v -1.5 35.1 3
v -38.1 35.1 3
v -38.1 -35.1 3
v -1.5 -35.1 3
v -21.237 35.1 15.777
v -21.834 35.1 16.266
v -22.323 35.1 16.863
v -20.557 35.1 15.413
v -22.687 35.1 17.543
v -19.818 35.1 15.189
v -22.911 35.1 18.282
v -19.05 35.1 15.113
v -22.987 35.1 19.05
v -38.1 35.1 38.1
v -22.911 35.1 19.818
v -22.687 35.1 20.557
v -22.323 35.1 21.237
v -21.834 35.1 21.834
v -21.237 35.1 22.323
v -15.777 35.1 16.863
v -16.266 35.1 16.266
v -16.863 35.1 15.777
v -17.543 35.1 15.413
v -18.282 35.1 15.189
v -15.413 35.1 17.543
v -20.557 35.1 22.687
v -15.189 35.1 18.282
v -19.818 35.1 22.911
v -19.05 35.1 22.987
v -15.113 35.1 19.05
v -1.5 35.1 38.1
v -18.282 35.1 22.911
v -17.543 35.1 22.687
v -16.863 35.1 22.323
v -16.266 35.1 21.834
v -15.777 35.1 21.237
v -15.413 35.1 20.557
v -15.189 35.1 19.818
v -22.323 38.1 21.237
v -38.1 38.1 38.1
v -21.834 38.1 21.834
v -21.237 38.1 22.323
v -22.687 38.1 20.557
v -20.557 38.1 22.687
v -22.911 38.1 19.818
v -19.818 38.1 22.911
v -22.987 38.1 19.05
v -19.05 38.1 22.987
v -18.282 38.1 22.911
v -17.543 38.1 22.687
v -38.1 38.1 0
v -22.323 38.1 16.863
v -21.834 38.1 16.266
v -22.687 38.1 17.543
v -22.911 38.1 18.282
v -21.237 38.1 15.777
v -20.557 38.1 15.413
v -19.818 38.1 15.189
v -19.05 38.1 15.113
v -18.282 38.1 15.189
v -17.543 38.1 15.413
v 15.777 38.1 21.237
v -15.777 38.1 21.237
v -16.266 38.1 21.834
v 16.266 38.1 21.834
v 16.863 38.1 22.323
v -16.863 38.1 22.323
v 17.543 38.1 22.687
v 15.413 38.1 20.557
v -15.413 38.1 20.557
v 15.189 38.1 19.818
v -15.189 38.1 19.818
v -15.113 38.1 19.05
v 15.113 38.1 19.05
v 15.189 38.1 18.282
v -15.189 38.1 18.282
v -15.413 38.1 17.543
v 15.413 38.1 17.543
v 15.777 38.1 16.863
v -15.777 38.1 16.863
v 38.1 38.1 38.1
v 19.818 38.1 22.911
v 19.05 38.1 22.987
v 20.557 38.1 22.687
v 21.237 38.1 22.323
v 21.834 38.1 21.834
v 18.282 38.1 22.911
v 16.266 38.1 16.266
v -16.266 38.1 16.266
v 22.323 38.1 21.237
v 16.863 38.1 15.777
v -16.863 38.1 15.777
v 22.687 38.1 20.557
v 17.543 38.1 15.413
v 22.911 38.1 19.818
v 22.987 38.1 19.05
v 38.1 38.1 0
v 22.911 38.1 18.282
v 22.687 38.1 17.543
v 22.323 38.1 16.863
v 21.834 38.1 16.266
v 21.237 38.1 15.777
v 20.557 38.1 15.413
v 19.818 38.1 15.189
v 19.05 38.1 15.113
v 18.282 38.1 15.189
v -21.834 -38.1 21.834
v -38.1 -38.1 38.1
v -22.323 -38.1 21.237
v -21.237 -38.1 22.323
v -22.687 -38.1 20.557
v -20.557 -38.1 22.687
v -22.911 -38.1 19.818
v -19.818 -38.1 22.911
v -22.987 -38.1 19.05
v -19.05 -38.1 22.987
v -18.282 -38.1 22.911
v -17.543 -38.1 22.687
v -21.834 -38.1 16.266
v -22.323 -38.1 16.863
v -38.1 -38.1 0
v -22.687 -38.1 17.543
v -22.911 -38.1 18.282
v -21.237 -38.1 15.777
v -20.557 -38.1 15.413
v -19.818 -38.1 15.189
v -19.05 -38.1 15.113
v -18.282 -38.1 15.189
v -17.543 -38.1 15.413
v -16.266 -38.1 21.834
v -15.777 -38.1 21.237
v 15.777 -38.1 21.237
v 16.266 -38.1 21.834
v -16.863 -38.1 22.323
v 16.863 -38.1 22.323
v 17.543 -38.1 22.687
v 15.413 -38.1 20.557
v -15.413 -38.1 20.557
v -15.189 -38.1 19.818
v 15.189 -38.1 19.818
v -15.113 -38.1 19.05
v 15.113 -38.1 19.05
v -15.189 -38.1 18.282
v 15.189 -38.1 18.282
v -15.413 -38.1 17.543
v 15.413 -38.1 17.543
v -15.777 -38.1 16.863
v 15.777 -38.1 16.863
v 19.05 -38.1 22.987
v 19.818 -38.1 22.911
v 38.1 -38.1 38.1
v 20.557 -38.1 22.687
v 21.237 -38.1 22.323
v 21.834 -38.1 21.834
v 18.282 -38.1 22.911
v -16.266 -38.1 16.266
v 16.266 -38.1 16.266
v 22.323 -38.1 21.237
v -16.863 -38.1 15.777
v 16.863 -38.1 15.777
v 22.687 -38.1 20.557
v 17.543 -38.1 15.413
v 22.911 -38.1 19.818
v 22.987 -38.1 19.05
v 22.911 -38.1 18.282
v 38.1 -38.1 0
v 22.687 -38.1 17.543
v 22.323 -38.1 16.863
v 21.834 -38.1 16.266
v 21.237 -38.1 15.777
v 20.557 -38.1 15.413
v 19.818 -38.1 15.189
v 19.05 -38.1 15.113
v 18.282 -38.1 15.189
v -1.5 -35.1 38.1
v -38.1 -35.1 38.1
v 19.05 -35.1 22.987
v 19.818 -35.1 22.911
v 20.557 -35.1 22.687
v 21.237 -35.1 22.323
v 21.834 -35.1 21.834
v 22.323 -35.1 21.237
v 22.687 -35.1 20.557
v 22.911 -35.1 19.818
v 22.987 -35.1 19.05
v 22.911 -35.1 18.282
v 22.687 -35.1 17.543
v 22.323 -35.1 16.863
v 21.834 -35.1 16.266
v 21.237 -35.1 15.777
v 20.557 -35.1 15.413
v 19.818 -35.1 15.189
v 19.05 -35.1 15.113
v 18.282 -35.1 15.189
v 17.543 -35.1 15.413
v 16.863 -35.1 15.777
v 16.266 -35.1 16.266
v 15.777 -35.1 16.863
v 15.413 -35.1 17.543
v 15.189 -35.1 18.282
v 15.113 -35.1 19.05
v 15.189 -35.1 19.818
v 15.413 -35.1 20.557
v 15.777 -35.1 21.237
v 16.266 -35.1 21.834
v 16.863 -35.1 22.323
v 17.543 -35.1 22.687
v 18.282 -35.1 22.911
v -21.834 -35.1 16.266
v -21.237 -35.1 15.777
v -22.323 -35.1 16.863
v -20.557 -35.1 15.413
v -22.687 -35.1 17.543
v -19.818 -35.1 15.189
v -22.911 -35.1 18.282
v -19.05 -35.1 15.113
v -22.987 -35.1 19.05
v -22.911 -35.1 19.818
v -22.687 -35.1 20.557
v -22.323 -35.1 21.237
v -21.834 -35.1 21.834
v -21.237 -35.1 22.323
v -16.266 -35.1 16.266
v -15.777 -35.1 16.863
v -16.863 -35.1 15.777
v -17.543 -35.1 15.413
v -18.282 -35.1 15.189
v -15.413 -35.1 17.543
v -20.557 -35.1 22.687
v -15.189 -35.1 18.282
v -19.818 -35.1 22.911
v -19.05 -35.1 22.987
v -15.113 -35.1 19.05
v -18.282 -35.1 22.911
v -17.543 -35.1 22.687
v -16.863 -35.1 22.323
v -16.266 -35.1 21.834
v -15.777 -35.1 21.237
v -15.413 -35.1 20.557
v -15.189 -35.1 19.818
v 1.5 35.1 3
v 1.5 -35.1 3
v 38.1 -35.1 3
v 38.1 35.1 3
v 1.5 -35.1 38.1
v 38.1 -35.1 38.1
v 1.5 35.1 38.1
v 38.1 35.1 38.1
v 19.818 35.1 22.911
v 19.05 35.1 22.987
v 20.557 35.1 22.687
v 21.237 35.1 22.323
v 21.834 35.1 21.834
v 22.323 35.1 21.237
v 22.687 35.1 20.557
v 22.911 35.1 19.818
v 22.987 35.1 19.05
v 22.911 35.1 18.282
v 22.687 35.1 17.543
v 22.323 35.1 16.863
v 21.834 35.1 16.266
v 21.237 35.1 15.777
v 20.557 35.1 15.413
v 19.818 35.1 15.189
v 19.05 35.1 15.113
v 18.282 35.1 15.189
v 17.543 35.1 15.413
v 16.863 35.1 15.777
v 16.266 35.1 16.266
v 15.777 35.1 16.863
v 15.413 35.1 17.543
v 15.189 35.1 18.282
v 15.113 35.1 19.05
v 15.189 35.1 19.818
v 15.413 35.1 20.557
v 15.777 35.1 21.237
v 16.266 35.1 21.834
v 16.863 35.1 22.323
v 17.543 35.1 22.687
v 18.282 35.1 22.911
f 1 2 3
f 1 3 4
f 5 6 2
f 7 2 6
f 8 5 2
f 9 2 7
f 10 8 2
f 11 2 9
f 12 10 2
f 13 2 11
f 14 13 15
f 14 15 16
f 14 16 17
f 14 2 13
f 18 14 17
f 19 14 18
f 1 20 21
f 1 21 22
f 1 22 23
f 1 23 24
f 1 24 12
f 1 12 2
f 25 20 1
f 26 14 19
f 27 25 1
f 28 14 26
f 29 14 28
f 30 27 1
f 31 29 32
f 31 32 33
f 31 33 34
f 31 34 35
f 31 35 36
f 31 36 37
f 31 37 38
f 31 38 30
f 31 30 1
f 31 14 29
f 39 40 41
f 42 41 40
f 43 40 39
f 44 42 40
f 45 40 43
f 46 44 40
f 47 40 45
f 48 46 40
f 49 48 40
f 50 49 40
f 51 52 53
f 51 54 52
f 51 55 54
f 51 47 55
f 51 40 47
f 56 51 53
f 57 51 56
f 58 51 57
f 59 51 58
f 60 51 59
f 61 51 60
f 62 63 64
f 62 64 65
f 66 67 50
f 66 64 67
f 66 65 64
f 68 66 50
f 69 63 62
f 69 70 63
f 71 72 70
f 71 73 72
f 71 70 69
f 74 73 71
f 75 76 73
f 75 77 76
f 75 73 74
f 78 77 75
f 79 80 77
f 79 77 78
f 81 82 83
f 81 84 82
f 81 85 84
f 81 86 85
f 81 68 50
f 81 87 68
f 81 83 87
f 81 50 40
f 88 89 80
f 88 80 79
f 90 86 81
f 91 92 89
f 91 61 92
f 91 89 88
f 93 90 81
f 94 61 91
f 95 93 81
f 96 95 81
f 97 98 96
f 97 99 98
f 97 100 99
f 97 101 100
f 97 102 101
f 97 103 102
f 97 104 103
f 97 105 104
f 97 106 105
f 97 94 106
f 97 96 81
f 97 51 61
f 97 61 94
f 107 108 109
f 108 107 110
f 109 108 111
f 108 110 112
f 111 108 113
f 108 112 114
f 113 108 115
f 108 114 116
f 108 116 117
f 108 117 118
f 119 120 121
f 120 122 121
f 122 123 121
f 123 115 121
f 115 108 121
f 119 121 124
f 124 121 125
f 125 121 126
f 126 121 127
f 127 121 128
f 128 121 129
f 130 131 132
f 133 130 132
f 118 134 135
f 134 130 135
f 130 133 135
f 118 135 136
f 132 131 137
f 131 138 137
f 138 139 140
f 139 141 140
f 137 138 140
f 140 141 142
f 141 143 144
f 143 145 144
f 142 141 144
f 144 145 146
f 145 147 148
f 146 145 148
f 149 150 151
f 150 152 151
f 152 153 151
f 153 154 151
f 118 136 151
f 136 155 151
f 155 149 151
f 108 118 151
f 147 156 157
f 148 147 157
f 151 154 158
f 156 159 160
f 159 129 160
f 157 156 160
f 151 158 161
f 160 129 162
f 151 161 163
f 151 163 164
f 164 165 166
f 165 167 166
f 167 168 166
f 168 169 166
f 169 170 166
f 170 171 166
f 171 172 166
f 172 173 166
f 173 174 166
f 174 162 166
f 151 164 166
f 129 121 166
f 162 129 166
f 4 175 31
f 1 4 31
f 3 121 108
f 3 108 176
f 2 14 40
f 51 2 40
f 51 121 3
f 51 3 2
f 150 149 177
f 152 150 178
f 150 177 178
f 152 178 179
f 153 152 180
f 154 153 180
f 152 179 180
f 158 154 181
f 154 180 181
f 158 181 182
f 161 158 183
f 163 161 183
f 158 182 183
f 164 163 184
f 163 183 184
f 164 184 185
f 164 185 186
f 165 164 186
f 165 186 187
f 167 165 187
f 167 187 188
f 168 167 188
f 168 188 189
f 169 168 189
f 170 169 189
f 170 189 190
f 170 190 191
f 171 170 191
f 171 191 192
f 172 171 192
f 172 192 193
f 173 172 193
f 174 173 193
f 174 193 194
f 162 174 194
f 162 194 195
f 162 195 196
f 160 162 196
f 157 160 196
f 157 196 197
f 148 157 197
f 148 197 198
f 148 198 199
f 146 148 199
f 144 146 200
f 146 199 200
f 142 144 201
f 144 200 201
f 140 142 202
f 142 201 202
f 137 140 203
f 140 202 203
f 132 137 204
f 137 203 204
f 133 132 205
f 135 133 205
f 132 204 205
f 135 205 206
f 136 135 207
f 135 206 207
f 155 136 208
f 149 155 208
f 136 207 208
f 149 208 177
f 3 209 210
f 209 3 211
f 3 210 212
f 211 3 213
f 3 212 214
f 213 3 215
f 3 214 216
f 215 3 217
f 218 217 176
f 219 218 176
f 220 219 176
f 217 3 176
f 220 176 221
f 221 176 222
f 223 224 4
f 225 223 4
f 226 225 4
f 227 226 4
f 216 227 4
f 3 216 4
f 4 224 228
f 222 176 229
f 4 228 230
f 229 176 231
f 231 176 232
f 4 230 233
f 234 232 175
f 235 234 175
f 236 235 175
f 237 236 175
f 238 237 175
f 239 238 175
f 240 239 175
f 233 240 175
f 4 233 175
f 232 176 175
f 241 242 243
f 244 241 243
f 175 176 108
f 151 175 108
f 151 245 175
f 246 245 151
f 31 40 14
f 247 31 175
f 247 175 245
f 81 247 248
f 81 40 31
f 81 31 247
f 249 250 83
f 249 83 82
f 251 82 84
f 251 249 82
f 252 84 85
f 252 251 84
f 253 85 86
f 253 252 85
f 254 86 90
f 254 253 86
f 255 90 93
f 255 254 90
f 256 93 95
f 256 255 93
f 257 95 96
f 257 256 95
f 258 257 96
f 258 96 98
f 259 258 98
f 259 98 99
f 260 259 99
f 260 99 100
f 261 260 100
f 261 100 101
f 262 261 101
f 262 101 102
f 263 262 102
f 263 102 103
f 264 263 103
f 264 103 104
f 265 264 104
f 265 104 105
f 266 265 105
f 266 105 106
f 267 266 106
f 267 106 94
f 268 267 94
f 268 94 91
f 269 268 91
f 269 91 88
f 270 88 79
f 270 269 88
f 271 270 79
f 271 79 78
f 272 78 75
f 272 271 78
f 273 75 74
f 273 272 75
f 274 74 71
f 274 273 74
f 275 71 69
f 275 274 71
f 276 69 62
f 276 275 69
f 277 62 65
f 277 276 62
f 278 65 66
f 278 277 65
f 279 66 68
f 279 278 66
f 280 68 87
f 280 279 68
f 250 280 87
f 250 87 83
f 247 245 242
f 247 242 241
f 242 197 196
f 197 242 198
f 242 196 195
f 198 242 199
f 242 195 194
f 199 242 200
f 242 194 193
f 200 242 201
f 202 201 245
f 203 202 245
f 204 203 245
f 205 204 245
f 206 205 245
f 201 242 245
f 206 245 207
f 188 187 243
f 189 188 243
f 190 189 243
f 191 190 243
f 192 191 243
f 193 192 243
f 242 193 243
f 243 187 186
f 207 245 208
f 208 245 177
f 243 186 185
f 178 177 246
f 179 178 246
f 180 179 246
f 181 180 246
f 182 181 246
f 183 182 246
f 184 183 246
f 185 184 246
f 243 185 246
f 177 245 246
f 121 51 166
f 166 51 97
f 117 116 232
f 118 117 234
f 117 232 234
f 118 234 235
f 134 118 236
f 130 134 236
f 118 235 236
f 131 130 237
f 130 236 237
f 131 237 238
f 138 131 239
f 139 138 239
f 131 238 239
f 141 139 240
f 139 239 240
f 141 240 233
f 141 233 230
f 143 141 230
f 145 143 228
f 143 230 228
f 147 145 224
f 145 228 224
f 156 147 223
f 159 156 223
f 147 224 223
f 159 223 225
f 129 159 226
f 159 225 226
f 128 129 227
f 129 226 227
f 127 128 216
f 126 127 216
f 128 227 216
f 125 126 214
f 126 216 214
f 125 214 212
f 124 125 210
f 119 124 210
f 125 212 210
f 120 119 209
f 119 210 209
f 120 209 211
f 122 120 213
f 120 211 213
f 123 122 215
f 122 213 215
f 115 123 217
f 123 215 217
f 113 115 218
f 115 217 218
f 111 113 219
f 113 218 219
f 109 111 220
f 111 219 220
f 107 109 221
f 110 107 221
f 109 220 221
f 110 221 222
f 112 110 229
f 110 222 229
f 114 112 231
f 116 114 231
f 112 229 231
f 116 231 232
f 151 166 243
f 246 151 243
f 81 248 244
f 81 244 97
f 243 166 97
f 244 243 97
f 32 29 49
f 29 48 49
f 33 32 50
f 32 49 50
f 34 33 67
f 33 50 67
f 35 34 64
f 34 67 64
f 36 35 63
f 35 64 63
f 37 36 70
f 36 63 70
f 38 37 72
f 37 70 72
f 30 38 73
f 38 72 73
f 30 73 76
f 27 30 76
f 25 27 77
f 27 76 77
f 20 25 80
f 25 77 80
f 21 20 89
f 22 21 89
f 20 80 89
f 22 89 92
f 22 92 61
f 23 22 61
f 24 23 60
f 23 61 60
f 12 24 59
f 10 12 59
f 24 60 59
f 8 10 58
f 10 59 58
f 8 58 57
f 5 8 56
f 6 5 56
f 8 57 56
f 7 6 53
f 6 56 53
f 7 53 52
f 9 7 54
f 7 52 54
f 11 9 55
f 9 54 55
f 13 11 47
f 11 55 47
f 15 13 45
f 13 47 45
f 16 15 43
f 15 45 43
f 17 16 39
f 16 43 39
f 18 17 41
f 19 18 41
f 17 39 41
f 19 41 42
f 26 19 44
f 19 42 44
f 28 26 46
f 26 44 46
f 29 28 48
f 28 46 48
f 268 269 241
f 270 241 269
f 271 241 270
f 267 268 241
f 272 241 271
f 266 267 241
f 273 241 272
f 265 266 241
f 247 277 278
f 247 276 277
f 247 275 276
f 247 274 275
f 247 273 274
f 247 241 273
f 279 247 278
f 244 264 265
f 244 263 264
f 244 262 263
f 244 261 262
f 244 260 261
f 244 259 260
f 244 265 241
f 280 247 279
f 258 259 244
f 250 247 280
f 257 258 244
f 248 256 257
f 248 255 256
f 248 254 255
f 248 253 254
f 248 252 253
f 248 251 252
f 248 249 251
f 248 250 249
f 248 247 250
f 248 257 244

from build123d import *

# Parameters (mm, degrees)
SKETCH1_W           = 76.2
SKETCH1_H           = 76.2
BOSS_EXTRUDE1_DEPTH = 38.1
SKETCH3_W           = 39.463440316
SKETCH3_H           = 70.199999808
SKETCH3_W_2         = 39.34827811
CUT_EXTRUDE1_DEPTH  = 35.100000006
SKETCH4_R           = 3.937
CUT_EXTRUDE2_DEPTH  = 38.1


with BuildPart() as part:
    # Sketch1 → Boss-Extrude1 (new body)
    with BuildSketch(Plane.XY):
        Rectangle(SKETCH1_W, SKETCH1_H)
    extrude(amount=BOSS_EXTRUDE1_DEPTH)

    # Sketch3 → Cut-Extrude1 (cut)
    with BuildSketch(Plane.XY.offset(38.1)):
        with Locations((21.231720251, 0)):
            Rectangle(SKETCH3_W, SKETCH3_H)
        with Locations((-21.174138956, 0)):
            Rectangle(SKETCH3_W_2, SKETCH3_H)
    extrude(amount=-CUT_EXTRUDE1_DEPTH, mode=Mode.SUBTRACT)

    # Sketch4 → Cut-Extrude2 (cut, symmetric)
    with BuildSketch(Plane(origin=(0, 0, 0), x_dir=(1, 0, 0), z_dir=(0, 1, 0))):
        with Locations(Location((19.05, -19.05, 0), (0, 0, 270))):
            Circle(SKETCH4_R)
        with Locations(Location((-19.05, -19.05, 0), (0, 0, 270))):
            Circle(SKETCH4_R)
    extrude(amount=CUT_EXTRUDE2_DEPTH, both=True, mode=Mode.SUBTRACT)


solid = part.part
